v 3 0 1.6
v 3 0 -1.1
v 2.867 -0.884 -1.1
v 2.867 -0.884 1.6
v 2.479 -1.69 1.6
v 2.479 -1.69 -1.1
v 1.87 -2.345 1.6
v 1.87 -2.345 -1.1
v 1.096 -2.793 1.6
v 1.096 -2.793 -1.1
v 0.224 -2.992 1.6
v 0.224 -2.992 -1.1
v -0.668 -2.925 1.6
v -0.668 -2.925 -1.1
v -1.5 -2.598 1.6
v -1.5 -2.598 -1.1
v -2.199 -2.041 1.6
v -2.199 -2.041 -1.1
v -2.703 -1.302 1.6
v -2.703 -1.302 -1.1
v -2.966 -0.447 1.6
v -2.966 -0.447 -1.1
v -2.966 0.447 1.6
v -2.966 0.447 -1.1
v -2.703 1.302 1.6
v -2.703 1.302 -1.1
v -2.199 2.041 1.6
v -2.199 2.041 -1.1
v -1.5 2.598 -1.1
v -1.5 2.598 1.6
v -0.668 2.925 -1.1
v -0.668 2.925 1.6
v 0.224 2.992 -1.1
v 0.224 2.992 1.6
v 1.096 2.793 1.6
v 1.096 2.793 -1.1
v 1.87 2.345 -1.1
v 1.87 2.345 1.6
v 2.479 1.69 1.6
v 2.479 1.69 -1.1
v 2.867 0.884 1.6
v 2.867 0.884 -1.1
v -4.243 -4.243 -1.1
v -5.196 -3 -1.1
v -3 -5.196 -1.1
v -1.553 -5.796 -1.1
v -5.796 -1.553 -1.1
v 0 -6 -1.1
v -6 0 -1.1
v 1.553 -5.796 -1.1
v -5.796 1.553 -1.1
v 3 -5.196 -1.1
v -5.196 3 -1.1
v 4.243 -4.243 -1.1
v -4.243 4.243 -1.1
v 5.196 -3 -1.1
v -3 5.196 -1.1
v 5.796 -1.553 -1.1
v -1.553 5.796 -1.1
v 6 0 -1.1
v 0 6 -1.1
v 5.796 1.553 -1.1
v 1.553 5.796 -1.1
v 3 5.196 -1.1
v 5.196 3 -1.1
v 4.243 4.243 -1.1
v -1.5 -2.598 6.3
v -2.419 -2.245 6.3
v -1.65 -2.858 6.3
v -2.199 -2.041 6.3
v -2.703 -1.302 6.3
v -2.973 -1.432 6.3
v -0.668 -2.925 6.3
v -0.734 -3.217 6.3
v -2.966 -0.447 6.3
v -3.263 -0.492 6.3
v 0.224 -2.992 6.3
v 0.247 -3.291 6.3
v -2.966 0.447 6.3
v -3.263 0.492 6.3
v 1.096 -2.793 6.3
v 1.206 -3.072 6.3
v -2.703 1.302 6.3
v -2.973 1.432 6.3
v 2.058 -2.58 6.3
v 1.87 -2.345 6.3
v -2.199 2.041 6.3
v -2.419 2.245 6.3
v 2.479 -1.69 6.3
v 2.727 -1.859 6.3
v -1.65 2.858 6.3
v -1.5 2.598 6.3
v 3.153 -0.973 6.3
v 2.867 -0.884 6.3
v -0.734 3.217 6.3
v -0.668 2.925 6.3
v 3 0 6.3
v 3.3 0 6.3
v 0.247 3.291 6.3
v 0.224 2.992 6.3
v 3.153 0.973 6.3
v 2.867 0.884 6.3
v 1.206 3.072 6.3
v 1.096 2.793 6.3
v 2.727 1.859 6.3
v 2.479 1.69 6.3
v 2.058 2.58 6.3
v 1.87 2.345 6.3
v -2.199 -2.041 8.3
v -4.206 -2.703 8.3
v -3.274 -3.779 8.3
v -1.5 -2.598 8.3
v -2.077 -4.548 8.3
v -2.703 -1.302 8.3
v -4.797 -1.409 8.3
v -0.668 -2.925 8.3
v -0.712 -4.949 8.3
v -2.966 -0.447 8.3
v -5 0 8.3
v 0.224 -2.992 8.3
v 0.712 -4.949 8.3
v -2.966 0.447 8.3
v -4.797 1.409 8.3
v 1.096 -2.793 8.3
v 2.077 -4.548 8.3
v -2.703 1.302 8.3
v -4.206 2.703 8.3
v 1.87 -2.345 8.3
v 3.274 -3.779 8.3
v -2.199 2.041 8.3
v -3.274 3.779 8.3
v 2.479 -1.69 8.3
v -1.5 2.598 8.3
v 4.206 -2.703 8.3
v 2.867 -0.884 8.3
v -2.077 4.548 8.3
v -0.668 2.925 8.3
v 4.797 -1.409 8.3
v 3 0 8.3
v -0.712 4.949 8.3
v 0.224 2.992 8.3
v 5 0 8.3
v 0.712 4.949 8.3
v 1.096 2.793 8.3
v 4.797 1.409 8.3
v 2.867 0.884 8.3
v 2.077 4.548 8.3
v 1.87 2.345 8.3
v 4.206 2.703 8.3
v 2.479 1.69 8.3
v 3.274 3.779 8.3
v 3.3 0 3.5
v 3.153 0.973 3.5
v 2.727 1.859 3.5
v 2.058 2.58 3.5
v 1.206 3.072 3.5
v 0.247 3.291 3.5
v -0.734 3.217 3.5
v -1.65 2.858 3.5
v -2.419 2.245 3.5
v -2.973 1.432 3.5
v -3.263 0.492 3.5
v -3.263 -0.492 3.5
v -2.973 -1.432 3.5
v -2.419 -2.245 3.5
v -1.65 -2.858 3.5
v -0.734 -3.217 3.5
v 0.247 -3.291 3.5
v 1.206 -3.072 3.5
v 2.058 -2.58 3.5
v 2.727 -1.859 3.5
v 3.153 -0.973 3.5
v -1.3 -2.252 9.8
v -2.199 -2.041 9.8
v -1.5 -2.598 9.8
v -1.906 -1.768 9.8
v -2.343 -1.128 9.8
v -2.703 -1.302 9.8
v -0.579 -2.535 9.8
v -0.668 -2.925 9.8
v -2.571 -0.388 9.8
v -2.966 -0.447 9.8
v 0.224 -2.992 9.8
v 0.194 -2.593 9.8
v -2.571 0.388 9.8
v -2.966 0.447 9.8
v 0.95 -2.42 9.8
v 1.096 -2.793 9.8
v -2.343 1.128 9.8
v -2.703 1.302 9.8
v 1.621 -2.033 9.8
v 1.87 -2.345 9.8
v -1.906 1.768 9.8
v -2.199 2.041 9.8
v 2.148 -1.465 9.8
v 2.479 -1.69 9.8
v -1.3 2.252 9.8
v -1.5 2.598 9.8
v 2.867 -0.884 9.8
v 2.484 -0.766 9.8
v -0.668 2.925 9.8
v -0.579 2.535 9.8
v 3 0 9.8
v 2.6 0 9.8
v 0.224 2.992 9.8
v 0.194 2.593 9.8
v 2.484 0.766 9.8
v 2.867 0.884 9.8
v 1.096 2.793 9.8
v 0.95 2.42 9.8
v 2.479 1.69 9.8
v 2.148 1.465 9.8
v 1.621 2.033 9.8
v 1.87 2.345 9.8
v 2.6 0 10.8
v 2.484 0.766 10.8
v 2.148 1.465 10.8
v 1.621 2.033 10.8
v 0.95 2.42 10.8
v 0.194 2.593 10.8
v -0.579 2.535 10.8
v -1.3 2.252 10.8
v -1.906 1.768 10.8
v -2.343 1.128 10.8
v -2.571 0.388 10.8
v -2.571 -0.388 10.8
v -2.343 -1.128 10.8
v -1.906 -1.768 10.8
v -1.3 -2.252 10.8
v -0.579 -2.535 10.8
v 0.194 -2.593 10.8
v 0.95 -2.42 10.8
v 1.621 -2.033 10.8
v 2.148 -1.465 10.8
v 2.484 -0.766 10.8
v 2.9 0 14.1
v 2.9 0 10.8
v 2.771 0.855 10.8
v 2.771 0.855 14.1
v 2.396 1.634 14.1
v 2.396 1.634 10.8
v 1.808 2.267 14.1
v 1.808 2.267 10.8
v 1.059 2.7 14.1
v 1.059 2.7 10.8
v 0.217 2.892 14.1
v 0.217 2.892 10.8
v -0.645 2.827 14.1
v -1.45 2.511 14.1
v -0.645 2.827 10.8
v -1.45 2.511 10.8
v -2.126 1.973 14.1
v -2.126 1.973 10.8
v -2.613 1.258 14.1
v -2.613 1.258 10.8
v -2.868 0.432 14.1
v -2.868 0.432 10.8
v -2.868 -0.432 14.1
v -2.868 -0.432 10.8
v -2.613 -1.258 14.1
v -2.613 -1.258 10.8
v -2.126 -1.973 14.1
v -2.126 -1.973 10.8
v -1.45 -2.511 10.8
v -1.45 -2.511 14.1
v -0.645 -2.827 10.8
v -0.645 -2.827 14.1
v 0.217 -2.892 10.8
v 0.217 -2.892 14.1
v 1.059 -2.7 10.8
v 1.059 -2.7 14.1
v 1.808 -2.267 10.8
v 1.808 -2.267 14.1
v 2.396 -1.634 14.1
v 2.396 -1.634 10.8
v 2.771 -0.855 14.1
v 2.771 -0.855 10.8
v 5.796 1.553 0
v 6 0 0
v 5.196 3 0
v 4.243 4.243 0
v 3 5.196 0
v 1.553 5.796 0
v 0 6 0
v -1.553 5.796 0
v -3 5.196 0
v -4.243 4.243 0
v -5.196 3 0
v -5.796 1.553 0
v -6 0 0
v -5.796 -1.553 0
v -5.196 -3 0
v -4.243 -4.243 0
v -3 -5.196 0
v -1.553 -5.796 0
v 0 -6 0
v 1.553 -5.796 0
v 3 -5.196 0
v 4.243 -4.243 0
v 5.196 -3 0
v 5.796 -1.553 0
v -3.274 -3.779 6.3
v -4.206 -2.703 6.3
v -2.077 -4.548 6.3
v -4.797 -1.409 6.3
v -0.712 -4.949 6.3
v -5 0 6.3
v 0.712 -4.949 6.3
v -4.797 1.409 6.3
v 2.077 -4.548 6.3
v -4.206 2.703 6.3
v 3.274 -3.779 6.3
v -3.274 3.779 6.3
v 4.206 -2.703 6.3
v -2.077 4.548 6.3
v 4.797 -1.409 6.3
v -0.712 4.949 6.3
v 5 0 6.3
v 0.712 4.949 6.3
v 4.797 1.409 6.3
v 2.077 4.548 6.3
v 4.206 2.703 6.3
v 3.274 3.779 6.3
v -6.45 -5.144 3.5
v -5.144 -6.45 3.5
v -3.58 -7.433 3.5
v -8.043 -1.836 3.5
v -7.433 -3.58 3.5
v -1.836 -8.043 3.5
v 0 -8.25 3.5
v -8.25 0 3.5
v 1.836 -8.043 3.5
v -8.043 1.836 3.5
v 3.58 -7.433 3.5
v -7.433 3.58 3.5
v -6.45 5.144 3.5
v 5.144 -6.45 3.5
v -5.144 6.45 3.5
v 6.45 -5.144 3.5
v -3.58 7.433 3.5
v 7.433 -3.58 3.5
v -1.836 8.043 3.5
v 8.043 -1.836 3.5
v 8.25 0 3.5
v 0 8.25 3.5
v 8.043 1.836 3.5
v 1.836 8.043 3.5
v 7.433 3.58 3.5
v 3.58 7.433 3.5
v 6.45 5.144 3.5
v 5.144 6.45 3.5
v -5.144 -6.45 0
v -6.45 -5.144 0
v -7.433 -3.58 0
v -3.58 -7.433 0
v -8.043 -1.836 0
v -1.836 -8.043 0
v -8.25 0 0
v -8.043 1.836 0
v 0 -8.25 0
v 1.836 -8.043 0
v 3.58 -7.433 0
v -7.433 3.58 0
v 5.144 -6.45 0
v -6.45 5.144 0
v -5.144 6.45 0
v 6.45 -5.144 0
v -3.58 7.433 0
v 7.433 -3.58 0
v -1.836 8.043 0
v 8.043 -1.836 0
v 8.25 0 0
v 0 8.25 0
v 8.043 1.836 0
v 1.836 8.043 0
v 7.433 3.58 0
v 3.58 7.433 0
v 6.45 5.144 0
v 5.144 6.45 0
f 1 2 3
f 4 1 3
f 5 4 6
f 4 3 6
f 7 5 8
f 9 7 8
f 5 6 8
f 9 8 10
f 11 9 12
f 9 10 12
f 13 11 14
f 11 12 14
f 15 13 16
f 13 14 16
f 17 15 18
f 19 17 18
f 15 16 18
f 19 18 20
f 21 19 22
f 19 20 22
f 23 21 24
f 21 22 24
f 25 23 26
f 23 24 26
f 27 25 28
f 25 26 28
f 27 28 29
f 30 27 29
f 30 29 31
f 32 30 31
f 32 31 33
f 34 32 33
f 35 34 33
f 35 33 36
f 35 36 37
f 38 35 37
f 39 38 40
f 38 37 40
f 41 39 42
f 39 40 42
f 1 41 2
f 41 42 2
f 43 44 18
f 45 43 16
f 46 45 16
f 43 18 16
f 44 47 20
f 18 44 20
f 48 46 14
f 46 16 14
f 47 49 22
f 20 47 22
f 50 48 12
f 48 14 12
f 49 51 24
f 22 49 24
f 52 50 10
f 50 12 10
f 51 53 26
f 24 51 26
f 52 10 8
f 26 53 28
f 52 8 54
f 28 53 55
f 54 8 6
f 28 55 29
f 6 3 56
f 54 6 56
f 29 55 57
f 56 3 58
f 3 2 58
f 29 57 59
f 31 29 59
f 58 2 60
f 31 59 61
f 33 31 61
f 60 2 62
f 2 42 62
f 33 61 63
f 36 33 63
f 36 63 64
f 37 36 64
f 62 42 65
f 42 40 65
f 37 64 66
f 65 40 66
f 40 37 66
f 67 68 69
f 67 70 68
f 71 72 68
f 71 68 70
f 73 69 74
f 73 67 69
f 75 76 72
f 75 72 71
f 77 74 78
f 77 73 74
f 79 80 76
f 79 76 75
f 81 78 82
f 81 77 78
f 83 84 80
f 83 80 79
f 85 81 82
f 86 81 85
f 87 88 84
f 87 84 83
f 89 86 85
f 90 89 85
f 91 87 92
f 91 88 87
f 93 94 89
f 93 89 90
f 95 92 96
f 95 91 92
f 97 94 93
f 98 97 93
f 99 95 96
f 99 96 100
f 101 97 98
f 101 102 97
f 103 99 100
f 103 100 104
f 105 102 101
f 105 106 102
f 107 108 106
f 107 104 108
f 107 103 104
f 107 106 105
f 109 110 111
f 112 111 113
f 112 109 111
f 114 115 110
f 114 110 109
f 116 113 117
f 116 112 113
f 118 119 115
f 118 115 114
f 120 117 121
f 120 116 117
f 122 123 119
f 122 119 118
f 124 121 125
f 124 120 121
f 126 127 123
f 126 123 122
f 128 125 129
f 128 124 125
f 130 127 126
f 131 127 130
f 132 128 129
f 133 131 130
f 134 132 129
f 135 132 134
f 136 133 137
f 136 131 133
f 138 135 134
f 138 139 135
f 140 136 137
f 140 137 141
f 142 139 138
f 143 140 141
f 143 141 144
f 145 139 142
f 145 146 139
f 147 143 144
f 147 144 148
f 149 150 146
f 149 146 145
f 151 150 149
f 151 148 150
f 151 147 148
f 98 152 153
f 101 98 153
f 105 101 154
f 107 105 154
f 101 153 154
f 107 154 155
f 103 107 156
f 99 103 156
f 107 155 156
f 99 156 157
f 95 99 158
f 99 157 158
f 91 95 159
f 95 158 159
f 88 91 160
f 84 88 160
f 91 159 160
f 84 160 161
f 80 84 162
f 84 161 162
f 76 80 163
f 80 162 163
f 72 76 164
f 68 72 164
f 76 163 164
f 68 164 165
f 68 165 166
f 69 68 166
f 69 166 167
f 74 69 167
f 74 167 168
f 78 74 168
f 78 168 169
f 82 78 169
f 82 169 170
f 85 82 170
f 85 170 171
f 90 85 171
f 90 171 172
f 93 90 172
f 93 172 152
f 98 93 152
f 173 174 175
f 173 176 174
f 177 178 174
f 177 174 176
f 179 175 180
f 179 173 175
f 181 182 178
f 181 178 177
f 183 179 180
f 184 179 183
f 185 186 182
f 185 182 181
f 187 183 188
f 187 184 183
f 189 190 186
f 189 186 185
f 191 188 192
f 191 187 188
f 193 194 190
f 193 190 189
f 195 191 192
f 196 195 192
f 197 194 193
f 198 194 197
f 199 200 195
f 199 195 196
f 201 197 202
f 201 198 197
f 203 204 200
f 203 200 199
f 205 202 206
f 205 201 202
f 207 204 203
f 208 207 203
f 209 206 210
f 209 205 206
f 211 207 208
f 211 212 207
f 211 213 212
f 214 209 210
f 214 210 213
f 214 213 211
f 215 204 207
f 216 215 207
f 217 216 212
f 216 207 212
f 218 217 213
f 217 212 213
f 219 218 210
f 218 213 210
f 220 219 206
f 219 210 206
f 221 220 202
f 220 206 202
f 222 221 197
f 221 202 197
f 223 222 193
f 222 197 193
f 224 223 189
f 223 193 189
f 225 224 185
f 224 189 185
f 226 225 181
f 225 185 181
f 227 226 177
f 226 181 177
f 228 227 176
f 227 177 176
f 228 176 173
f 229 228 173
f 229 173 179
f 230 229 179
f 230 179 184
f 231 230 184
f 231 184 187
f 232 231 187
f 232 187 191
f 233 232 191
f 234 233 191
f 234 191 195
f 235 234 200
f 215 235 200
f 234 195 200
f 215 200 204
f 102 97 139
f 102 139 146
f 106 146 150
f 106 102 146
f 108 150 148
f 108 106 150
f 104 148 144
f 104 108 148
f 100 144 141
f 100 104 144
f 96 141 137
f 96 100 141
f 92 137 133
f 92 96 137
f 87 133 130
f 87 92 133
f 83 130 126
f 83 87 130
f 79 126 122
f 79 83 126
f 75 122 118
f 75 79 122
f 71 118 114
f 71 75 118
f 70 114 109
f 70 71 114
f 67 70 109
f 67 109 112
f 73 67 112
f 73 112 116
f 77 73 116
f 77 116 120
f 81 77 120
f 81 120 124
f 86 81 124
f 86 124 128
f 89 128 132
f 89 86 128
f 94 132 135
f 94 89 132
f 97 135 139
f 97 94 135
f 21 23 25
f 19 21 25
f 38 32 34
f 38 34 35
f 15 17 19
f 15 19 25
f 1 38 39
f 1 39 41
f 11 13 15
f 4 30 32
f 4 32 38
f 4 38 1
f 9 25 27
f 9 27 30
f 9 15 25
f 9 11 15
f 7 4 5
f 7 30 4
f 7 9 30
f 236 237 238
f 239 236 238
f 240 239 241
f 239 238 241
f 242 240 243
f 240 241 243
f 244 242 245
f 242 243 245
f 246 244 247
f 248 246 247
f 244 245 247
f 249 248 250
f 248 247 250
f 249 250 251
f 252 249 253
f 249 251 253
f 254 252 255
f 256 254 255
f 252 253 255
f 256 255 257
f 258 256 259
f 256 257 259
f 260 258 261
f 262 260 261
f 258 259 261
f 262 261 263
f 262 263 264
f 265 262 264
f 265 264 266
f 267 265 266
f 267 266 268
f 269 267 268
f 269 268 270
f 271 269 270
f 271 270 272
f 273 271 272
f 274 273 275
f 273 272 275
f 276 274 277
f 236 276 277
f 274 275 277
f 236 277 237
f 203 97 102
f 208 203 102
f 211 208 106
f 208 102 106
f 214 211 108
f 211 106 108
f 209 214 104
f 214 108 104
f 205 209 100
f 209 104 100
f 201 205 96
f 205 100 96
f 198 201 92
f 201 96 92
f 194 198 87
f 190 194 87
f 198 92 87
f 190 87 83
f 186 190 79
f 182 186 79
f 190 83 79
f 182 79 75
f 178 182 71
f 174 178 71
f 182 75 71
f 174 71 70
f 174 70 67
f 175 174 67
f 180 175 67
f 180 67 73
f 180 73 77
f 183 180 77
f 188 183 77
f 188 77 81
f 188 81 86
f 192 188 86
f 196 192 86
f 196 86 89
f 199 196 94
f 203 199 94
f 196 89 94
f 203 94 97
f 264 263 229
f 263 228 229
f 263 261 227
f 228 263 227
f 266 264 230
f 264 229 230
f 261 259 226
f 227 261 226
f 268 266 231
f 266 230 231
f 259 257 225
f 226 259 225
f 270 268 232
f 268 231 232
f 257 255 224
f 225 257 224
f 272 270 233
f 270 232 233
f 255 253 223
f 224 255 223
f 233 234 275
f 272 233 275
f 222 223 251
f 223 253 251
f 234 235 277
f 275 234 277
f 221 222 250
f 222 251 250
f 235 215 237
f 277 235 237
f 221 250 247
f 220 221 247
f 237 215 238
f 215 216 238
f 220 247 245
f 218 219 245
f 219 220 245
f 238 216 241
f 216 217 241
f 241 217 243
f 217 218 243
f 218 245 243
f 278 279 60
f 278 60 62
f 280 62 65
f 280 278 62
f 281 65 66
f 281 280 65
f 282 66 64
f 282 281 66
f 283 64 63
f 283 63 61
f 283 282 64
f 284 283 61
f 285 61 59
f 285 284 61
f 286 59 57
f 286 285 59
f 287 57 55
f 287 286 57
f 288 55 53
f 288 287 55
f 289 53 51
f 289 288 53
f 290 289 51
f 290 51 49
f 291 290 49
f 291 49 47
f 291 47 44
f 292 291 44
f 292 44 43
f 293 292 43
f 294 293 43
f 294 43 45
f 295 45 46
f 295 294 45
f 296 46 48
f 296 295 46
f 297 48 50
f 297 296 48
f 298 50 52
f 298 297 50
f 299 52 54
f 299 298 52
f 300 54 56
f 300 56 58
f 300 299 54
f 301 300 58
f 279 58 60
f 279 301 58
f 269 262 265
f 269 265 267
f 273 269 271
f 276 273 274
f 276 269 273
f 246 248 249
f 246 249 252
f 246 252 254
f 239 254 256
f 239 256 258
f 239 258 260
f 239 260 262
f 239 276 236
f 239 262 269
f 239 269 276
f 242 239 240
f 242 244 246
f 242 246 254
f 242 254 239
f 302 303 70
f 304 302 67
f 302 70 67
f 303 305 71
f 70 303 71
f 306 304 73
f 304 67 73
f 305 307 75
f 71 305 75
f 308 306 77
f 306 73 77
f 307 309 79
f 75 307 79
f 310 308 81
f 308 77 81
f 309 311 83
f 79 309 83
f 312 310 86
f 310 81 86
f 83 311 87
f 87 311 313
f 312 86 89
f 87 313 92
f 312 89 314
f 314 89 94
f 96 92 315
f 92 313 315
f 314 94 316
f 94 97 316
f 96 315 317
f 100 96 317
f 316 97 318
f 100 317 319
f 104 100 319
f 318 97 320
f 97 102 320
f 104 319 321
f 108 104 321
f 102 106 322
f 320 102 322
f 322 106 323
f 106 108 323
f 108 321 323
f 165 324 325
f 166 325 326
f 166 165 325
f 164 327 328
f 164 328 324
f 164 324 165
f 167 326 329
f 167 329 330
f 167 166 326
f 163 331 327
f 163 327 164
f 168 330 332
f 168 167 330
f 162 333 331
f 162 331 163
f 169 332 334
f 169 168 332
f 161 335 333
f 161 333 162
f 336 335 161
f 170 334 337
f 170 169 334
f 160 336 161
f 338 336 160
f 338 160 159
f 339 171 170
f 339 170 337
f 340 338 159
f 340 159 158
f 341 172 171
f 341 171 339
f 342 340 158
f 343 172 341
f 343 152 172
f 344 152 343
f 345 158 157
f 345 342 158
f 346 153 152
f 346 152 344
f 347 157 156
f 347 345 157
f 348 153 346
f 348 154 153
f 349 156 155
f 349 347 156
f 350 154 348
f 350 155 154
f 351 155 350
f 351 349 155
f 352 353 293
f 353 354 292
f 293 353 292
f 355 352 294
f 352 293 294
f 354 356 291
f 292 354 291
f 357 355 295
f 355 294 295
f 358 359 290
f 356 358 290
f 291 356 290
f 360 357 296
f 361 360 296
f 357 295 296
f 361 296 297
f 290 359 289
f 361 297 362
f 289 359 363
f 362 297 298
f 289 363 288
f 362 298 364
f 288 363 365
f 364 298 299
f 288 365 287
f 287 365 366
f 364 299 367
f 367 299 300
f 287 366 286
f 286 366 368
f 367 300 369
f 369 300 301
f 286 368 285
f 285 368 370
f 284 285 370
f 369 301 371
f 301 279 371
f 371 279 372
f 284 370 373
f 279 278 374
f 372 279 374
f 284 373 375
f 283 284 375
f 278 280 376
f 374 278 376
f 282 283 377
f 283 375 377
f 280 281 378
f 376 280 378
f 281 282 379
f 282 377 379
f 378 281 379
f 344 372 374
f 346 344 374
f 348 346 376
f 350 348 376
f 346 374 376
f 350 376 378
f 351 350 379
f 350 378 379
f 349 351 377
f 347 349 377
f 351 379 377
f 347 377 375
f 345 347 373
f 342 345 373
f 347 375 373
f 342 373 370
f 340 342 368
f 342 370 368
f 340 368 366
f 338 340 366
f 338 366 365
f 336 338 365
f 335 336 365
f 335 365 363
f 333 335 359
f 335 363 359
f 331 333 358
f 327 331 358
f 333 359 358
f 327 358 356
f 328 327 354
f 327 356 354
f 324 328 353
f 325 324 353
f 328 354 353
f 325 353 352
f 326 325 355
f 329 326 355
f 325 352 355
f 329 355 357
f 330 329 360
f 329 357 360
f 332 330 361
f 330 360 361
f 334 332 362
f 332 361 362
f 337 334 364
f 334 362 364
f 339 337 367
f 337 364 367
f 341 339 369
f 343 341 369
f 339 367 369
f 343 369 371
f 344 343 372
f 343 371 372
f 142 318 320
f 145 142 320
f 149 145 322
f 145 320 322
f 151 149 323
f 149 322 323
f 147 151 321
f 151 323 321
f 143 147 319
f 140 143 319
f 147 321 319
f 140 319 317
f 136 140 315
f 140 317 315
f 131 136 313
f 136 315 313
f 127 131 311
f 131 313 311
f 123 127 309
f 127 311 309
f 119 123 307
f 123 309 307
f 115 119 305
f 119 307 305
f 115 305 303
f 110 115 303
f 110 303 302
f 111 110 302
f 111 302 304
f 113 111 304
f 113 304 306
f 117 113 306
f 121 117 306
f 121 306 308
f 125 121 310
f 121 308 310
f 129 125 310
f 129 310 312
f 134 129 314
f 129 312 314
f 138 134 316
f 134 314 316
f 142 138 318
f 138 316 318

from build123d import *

# Parameters (mm, degrees)
F0_R      = 8.25
F0_R_2    = 6
F0_R_3    = 3.3
F1_DEPTH  = 3.5
F2_DEPTH  = 6.3
F3_DEPTH  = 1.1
F4_R      = 3
F5_DEPTH  = 2.7
F6_R      = 5
F6_R_2    = 3.3
F6_R_3    = 3
F7_DEPTH  = 2
F8_DEPTH  = 3.5
F9_R      = 2.6
F10_DEPTH = 1
F11_R     = 2.9
F12_DEPTH = 3.3


with BuildPart() as f1:
    # F0 (on Top) → F1 (new body)
    with BuildSketch(Plane.XY):
        Circle(F0_R)
        Circle(F0_R_2, mode=Mode.SUBTRACT)
        Circle(F0_R_2)
        Circle(F0_R_3, mode=Mode.SUBTRACT)
    extrude(amount=F1_DEPTH)

    # F0 (on Top) → F2 (join)
    with BuildSketch(Plane.XY):
        Circle(F0_R_3)
    extrude(amount=F2_DEPTH)

    # F0 (on Top) → F3 (join)
    with BuildSketch(Plane.XY):
        Circle(F0_R_2)
        Circle(F0_R_3, mode=Mode.SUBTRACT)
        Circle(F0_R_3)
    extrude(amount=-F3_DEPTH)

    # F4 (on face) → F5 (cut)
    with BuildSketch(Plane(origin=(0, 0, -1.1), x_dir=(1, 0, 0), z_dir=(0, 0, -1))):
        Circle(F4_R)
    extrude(amount=-F5_DEPTH, mode=Mode.SUBTRACT)

    # F6 (on face) → F8 (join)
    with BuildSketch(Plane.XY.offset(6.3)):
        Circle(F6_R_3)
    extrude(amount=F8_DEPTH)

    # F9 (on face) → F10 (join)
    with BuildSketch(Plane.XY.offset(9.8)):
        Circle(F9_R)
    extrude(amount=F10_DEPTH)

    # F11 (on face) → F12 (join)
    with BuildSketch(Plane.XY.offset(10.8)):
        Circle(F11_R)
    extrude(amount=F12_DEPTH)


with BuildPart() as f7:
    # F6 (on face) → F7 (new body)
    with BuildSketch(Plane.XY.offset(6.3)):
        Circle(F6_R)
        Circle(F6_R_2, mode=Mode.SUBTRACT)
        Circle(F6_R_2)
        Circle(F6_R_3, mode=Mode.SUBTRACT)
    extrude(amount=F7_DEPTH)


solid = Compound([f1.part, f7.part])
